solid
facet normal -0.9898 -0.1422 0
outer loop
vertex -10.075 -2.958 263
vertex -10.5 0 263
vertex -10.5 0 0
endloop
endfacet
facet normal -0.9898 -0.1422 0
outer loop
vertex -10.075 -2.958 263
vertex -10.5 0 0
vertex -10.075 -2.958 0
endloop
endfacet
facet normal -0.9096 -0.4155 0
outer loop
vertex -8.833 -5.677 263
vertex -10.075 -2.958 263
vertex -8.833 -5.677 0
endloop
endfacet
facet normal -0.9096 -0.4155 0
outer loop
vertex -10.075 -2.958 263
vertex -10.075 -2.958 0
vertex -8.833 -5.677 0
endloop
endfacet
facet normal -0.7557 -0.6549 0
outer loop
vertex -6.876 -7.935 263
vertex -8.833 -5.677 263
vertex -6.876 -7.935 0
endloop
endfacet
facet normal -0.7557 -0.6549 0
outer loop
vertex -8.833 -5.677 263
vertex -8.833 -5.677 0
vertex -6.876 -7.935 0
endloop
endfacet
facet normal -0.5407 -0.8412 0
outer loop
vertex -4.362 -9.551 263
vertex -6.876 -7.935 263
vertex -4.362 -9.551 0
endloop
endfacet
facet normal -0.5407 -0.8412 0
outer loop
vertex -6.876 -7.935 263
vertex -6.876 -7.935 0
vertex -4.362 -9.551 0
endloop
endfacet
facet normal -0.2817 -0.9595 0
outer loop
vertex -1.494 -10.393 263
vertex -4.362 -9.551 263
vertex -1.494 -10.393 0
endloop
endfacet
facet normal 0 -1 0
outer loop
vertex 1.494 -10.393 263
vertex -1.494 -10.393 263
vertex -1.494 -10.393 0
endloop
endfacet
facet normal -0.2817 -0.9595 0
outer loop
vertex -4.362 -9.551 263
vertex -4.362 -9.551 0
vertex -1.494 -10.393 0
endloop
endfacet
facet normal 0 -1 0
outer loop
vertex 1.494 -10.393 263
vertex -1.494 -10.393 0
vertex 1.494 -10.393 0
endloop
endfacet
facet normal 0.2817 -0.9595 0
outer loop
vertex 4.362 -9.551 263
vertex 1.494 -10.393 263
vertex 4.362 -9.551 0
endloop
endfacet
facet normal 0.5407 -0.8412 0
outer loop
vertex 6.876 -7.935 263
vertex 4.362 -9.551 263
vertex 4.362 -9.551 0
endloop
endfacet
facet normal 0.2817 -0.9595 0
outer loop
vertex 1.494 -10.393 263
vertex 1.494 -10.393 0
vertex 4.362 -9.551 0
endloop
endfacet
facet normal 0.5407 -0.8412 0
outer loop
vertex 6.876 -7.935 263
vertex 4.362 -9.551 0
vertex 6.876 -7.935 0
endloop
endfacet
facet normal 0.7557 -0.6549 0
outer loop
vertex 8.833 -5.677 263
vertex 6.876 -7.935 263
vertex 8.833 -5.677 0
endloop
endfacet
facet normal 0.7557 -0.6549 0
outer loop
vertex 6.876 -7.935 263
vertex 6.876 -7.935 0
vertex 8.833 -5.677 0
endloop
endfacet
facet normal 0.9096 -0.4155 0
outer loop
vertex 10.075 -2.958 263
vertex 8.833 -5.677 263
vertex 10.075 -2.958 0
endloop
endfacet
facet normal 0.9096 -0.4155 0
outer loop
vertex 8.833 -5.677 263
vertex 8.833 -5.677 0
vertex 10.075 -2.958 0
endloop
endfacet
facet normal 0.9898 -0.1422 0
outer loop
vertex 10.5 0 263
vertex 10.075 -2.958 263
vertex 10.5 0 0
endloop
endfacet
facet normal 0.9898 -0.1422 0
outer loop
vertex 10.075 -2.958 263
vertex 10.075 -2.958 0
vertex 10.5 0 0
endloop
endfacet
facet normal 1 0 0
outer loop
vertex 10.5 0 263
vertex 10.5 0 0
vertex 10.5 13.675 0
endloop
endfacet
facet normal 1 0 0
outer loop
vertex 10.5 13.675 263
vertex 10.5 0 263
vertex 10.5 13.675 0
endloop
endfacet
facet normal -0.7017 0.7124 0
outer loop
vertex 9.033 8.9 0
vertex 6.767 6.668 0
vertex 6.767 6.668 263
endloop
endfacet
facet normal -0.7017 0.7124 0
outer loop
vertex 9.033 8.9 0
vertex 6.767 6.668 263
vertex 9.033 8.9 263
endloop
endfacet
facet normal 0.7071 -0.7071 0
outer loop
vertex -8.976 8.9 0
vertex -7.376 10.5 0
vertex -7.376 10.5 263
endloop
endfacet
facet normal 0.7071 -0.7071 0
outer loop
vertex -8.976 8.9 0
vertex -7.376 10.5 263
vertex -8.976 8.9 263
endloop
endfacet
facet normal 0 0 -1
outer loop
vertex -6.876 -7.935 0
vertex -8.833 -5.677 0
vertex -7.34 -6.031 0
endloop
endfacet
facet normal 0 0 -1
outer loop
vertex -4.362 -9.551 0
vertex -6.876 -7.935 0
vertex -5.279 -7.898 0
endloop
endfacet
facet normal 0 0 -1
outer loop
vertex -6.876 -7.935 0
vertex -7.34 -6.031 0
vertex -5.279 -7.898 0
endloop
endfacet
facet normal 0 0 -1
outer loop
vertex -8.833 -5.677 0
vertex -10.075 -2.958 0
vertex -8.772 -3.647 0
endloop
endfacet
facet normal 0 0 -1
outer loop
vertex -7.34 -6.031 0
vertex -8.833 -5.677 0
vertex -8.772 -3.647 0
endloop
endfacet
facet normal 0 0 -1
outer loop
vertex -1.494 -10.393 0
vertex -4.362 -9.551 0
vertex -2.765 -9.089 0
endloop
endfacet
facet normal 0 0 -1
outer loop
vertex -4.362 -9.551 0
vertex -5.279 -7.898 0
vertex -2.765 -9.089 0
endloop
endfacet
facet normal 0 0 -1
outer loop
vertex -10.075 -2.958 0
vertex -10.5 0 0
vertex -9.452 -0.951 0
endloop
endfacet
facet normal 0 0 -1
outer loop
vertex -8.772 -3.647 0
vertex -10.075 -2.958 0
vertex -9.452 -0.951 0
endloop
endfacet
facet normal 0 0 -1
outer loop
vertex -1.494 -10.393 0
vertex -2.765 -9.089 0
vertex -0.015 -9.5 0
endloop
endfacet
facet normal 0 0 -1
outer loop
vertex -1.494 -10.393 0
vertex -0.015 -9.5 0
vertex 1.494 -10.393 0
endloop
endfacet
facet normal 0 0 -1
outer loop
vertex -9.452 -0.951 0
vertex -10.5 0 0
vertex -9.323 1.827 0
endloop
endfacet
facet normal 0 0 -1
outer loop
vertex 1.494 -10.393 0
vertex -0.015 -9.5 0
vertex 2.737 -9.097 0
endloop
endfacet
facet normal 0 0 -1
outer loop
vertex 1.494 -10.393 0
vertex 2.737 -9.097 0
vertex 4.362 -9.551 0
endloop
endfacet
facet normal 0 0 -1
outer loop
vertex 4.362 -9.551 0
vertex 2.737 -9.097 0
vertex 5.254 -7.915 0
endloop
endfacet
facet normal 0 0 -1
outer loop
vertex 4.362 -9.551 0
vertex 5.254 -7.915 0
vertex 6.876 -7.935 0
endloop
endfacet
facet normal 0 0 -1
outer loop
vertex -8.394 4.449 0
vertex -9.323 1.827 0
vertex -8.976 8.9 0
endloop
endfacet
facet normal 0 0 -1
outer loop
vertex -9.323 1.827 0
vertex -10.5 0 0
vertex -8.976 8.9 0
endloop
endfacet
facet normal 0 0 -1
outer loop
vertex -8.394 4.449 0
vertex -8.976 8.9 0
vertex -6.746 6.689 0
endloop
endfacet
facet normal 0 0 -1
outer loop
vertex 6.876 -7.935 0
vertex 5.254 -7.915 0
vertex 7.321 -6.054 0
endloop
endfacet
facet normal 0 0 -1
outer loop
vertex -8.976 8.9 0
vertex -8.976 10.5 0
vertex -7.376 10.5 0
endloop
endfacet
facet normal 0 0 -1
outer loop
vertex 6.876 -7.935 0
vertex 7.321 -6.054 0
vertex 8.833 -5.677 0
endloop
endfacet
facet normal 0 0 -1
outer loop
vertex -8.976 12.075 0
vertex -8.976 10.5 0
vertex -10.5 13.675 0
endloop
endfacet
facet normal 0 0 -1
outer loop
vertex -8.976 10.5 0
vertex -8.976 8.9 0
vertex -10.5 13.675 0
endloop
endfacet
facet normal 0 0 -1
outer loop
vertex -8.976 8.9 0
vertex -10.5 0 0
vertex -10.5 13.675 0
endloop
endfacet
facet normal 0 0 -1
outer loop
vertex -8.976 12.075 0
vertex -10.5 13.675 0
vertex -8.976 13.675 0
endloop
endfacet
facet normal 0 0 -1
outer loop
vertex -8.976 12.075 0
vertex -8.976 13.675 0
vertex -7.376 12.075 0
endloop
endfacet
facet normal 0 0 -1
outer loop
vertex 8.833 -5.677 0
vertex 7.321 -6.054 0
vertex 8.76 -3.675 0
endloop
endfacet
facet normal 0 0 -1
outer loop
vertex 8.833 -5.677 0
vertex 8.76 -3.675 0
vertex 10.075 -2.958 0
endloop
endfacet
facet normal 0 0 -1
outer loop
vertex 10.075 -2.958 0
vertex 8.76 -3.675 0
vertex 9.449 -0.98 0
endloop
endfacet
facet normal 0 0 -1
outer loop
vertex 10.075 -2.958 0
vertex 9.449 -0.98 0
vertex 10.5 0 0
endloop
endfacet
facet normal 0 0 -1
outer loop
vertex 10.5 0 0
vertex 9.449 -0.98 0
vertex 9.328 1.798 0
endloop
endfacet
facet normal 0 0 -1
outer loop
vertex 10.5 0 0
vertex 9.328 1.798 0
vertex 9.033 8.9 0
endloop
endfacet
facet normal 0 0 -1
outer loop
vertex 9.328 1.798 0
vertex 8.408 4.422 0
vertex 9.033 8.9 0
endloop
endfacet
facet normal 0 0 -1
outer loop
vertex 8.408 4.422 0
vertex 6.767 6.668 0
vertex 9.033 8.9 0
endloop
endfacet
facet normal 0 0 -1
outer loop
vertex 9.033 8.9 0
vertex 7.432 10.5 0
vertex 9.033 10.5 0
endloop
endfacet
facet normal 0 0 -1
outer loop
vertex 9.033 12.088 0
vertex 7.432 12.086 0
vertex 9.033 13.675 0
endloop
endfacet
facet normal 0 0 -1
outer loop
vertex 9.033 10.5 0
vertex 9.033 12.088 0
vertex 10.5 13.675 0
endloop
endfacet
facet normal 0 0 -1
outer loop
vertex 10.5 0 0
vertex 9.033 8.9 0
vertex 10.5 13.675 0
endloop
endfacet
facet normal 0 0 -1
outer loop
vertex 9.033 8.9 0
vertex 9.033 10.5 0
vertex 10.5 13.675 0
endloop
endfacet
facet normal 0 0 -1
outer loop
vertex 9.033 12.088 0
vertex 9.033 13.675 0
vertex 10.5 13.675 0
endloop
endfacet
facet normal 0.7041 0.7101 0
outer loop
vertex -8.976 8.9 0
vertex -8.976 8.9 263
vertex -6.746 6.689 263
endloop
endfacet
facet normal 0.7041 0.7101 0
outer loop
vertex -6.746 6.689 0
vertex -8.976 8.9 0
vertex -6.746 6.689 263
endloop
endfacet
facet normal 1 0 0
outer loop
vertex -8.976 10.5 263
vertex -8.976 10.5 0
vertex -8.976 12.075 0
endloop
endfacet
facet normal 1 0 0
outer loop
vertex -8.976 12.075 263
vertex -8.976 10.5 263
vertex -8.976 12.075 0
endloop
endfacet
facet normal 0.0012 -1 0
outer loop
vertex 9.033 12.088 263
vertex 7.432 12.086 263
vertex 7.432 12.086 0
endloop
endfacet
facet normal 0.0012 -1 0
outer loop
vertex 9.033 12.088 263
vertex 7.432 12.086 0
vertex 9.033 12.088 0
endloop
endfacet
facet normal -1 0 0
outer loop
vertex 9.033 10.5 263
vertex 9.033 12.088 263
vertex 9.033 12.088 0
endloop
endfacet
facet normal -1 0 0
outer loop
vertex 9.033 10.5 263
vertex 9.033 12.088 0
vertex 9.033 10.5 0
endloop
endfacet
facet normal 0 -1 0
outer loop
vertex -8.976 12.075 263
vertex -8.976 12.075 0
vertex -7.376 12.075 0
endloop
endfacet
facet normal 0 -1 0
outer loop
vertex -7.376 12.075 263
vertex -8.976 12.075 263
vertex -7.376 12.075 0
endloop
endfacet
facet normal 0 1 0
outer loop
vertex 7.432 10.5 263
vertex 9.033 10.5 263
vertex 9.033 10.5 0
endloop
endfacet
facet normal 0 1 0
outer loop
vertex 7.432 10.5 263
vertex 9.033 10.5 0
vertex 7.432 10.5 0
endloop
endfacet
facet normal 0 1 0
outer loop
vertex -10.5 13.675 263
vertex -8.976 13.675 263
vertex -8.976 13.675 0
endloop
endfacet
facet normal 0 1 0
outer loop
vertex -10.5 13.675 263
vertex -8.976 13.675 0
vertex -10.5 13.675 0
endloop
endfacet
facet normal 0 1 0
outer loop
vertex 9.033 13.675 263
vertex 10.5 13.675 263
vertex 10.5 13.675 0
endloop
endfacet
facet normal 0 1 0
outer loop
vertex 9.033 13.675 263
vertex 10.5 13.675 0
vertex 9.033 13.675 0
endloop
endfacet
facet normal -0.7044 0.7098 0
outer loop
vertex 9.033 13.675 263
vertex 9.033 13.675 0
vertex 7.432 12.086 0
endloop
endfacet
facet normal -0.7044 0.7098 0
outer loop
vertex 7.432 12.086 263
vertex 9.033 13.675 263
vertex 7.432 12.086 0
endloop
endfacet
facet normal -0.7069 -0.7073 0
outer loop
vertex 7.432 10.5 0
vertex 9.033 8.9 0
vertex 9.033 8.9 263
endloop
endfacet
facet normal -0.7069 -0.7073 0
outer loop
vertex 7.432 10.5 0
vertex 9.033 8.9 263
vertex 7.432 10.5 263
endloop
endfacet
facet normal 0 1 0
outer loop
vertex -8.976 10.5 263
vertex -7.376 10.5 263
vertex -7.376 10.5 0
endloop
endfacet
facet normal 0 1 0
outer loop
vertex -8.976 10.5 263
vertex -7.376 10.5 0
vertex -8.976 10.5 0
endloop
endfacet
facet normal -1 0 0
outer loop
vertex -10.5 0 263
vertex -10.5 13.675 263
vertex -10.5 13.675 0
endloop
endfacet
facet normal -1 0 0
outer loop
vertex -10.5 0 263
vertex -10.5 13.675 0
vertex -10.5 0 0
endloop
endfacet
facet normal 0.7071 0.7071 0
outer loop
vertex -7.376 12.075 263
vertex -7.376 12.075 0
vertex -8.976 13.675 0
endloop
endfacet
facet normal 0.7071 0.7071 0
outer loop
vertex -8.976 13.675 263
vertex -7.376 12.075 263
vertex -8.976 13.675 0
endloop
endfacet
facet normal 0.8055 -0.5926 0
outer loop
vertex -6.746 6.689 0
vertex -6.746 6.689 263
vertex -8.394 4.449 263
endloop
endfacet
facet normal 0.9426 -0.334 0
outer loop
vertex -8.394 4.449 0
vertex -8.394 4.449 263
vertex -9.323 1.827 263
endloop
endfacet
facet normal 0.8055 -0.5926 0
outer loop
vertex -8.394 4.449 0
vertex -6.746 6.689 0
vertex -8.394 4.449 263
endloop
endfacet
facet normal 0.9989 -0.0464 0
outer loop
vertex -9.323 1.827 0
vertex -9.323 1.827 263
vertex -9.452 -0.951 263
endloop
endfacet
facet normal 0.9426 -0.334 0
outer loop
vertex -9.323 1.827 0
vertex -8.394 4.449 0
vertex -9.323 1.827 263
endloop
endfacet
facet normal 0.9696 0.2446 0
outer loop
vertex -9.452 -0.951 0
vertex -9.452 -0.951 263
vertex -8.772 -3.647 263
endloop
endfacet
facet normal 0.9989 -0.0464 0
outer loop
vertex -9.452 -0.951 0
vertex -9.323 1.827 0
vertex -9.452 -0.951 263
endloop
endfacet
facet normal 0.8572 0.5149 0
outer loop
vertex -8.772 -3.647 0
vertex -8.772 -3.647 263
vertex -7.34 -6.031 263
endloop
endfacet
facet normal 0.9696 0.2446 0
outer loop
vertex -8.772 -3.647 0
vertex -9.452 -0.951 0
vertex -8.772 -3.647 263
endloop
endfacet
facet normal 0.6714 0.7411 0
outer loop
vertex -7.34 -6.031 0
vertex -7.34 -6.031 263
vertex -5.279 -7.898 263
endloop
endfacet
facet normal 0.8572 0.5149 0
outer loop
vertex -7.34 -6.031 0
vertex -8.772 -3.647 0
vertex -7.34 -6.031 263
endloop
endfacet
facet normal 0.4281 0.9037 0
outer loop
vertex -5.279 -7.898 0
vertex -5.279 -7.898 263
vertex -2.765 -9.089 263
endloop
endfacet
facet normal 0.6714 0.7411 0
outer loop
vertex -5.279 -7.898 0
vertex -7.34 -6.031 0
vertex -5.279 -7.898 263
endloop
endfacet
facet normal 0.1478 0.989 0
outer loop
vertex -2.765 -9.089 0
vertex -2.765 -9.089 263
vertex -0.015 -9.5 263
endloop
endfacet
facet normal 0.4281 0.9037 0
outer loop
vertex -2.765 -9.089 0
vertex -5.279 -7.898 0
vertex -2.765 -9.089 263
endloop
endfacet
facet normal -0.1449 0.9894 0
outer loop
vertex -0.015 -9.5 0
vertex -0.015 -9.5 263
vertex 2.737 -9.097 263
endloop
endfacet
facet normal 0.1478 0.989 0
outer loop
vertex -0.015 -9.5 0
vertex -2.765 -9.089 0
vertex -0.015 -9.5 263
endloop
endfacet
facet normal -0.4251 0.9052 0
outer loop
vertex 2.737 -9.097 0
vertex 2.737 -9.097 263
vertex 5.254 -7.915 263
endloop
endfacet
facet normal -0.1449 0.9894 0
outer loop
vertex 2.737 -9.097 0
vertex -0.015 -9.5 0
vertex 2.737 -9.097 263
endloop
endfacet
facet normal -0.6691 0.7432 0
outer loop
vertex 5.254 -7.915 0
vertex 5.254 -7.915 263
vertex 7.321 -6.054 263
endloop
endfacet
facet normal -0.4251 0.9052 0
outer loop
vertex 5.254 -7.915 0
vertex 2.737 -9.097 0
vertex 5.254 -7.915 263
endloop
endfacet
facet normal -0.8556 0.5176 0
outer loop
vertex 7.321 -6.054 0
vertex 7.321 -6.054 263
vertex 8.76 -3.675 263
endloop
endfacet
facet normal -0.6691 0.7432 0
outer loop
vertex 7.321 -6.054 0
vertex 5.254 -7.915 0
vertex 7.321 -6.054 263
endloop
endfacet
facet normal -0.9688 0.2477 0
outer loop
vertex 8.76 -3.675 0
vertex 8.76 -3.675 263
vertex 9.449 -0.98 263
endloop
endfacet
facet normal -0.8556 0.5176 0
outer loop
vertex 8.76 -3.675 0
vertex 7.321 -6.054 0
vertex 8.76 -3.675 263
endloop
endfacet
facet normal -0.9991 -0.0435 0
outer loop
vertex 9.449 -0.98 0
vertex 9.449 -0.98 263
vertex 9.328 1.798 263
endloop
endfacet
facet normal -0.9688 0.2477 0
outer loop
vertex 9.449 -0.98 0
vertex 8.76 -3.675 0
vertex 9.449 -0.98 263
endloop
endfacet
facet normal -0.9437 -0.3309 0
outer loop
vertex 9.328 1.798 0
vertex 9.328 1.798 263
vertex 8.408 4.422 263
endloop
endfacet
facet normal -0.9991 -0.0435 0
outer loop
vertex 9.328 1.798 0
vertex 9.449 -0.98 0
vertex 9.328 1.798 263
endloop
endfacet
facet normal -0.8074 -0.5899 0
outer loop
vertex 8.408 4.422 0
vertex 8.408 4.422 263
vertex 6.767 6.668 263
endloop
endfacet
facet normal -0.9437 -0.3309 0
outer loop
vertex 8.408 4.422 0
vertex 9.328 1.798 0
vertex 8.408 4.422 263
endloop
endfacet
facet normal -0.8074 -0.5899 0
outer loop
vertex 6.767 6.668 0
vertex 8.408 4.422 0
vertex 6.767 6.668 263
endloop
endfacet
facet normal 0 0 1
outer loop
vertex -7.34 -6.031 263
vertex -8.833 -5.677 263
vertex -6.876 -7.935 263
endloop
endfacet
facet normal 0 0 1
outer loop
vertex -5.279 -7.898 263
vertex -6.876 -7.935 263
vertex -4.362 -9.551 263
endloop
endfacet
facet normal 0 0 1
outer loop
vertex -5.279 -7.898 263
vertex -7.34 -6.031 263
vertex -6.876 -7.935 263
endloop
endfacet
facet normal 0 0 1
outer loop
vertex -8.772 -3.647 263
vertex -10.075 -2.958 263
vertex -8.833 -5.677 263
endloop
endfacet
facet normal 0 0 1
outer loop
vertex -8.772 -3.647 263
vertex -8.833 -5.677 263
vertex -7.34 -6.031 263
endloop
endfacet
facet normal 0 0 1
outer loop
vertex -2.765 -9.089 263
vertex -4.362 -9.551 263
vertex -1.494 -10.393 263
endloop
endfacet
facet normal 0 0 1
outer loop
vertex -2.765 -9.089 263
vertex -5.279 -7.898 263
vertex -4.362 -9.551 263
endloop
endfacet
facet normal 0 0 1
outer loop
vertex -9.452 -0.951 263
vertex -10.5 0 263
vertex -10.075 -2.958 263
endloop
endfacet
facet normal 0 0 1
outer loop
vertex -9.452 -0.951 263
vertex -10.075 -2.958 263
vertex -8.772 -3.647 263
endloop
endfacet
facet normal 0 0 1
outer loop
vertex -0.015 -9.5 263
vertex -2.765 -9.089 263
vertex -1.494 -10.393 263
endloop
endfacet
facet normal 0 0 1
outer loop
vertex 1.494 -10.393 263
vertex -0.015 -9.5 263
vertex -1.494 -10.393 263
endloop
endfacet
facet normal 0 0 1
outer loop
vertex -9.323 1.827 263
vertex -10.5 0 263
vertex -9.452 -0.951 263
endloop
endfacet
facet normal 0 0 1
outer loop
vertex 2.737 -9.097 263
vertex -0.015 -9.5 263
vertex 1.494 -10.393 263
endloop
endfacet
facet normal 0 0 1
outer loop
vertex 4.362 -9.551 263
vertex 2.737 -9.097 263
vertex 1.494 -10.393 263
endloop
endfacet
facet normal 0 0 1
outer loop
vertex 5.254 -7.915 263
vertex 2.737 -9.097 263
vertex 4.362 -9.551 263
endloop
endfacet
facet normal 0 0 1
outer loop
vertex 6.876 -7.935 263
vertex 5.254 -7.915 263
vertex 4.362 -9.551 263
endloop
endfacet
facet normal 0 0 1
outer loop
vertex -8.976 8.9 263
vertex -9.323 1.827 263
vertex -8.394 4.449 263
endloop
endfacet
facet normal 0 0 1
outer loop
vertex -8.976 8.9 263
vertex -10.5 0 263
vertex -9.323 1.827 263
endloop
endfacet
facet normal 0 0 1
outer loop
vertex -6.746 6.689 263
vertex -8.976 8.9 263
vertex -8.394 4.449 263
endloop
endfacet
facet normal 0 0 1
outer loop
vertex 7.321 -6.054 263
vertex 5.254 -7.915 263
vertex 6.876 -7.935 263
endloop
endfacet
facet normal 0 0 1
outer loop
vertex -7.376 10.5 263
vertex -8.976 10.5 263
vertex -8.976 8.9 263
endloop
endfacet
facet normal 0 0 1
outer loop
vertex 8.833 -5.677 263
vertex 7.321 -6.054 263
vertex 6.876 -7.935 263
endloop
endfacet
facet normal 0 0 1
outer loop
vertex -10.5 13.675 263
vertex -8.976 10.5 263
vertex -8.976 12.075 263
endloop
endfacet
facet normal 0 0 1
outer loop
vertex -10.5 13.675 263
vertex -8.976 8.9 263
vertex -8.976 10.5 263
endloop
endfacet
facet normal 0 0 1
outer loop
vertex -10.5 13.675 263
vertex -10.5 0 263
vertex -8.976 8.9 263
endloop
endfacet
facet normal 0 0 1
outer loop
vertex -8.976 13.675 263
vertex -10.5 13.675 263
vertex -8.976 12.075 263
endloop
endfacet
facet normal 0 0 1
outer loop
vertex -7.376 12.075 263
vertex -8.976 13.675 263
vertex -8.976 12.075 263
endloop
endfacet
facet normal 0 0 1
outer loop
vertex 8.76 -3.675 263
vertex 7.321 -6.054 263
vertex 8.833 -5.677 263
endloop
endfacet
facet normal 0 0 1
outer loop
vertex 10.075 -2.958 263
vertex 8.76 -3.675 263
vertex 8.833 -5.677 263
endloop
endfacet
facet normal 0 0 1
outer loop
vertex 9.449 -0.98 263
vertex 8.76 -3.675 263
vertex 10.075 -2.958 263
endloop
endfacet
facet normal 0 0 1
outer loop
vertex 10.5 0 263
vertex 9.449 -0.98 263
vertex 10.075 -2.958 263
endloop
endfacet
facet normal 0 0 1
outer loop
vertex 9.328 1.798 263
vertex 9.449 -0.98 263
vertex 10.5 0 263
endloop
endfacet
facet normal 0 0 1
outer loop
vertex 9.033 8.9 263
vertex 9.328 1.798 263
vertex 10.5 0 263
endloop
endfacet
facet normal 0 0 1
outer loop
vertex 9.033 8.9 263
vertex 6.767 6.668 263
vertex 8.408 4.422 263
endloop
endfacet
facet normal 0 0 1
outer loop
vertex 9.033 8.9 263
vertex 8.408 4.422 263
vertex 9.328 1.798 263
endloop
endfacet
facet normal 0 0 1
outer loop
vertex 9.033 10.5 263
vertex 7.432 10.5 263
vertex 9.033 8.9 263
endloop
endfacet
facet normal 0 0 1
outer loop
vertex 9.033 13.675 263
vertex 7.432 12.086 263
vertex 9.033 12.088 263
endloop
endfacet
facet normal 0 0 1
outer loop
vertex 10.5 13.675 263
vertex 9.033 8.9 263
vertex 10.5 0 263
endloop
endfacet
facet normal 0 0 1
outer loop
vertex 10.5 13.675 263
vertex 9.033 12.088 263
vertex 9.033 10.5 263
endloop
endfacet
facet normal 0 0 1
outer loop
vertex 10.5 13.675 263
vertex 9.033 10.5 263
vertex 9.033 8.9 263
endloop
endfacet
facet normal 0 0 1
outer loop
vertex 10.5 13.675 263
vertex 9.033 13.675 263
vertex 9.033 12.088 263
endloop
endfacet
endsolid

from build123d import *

# Parameters (mm, degrees)
SKETCH1_R           = 10.5
SKETCH1_R_2         = 9.5
BOSS_EXTRUDE1_DEPTH = 263
BOSS_EXTRUDE2_DEPTH = 263
CUT_EXTRUDE1_DEPTH  = 264.564518904


with BuildPart() as part:
    # Sketch1 → Boss-Extrude1 (new body)
    # profile 1 of 3: a face of its own
    with BuildSketch(Plane.XY):
        with BuildLine():
            ThreePointArc((-10.5, 0), (-7.424621202, 7.424621202), (0, 10.5))
            Line((0, 10.5), (-10.5, 10.5))
            Line((-10.5, 10.5), (-10.5, 0))
        make_face()
    # profile 2 of 3: a face of its own
    with BuildSketch(Plane.XY):
        with BuildLine():
            Line((10.5, 10.5), (0, 10.5))
            ThreePointArc((0, 10.5), (7.424621202, 7.424621202), (10.5, 0))
            Line((10.5, 0), (10.5, 10.5))
        make_face()
    # profile 3 of 3: a face of its own
    with BuildSketch(Plane.XY):
        Circle(SKETCH1_R)
        Circle(SKETCH1_R_2, mode=Mode.SUBTRACT)
    extrude(amount=BOSS_EXTRUDE1_DEPTH)

    # Sketch2 → Boss-Extrude2 (add)
    with BuildSketch(Plane.XY.offset(263)):
        Polygon((-10.5, 13.675), (-10.5, 10.5), (-8.976, 10.5), (-8.976, 12.0748), (-8.976, 13.675), align=None)
        Polygon((-8.976, 13.675), (-8.976, 12.0748), (-7.3758, 12.0748), align=None)
        Polygon((7.4324, 12.086261455), (9.0326, 12.0875), (9.0326, 13.675), align=None)
        Polygon((9.0326, 12.0875), (9.0326, 10.5), (10.5, 10.5), (10.5, 13.675), (9.0326, 13.675), align=None)
    extrude(amount=-BOSS_EXTRUDE2_DEPTH)

    # Sketch3 → Cut-Extrude1 (cut, through all)
    with BuildSketch(Plane.XY.offset(263)):
        with BuildLine():
            ThreePointArc((-6.74608819, 6.688818591), (-5.154578199, 7.979995212), (-3.323185213, 8.8998))
            Line((-3.323185213, 8.8998), (-8.976, 8.8998))
            Line((-8.976, 8.8998), (-6.74608819, 6.688818591))
        make_face()
        with BuildLine():
            Line((3.323185213, 8.8998), (9.0326, 8.8998))
            Line((9.0326, 8.8998), (7.4324, 10.5))
            Line((7.4324, 10.5), (-7.3758, 10.5))
            Line((-7.3758, 10.5), (-8.976, 8.8998))
            Line((-8.976, 8.8998), (-3.323185213, 8.8998))
            ThreePointArc((-3.323185213, 8.8998), (0, 9.5), (3.323185213, 8.8998))
        make_face()
        with BuildLine():
            Line((6.767076018, 6.667584433), (9.0326, 8.8998))
            Line((9.0326, 8.8998), (3.323185213, 8.8998))
            ThreePointArc((3.323185213, 8.8998), (5.167111332, 7.971885629), (6.767076018, 6.667584433))
        make_face()
    extrude(amount=-CUT_EXTRUDE1_DEPTH, mode=Mode.SUBTRACT)


solid = part.part
